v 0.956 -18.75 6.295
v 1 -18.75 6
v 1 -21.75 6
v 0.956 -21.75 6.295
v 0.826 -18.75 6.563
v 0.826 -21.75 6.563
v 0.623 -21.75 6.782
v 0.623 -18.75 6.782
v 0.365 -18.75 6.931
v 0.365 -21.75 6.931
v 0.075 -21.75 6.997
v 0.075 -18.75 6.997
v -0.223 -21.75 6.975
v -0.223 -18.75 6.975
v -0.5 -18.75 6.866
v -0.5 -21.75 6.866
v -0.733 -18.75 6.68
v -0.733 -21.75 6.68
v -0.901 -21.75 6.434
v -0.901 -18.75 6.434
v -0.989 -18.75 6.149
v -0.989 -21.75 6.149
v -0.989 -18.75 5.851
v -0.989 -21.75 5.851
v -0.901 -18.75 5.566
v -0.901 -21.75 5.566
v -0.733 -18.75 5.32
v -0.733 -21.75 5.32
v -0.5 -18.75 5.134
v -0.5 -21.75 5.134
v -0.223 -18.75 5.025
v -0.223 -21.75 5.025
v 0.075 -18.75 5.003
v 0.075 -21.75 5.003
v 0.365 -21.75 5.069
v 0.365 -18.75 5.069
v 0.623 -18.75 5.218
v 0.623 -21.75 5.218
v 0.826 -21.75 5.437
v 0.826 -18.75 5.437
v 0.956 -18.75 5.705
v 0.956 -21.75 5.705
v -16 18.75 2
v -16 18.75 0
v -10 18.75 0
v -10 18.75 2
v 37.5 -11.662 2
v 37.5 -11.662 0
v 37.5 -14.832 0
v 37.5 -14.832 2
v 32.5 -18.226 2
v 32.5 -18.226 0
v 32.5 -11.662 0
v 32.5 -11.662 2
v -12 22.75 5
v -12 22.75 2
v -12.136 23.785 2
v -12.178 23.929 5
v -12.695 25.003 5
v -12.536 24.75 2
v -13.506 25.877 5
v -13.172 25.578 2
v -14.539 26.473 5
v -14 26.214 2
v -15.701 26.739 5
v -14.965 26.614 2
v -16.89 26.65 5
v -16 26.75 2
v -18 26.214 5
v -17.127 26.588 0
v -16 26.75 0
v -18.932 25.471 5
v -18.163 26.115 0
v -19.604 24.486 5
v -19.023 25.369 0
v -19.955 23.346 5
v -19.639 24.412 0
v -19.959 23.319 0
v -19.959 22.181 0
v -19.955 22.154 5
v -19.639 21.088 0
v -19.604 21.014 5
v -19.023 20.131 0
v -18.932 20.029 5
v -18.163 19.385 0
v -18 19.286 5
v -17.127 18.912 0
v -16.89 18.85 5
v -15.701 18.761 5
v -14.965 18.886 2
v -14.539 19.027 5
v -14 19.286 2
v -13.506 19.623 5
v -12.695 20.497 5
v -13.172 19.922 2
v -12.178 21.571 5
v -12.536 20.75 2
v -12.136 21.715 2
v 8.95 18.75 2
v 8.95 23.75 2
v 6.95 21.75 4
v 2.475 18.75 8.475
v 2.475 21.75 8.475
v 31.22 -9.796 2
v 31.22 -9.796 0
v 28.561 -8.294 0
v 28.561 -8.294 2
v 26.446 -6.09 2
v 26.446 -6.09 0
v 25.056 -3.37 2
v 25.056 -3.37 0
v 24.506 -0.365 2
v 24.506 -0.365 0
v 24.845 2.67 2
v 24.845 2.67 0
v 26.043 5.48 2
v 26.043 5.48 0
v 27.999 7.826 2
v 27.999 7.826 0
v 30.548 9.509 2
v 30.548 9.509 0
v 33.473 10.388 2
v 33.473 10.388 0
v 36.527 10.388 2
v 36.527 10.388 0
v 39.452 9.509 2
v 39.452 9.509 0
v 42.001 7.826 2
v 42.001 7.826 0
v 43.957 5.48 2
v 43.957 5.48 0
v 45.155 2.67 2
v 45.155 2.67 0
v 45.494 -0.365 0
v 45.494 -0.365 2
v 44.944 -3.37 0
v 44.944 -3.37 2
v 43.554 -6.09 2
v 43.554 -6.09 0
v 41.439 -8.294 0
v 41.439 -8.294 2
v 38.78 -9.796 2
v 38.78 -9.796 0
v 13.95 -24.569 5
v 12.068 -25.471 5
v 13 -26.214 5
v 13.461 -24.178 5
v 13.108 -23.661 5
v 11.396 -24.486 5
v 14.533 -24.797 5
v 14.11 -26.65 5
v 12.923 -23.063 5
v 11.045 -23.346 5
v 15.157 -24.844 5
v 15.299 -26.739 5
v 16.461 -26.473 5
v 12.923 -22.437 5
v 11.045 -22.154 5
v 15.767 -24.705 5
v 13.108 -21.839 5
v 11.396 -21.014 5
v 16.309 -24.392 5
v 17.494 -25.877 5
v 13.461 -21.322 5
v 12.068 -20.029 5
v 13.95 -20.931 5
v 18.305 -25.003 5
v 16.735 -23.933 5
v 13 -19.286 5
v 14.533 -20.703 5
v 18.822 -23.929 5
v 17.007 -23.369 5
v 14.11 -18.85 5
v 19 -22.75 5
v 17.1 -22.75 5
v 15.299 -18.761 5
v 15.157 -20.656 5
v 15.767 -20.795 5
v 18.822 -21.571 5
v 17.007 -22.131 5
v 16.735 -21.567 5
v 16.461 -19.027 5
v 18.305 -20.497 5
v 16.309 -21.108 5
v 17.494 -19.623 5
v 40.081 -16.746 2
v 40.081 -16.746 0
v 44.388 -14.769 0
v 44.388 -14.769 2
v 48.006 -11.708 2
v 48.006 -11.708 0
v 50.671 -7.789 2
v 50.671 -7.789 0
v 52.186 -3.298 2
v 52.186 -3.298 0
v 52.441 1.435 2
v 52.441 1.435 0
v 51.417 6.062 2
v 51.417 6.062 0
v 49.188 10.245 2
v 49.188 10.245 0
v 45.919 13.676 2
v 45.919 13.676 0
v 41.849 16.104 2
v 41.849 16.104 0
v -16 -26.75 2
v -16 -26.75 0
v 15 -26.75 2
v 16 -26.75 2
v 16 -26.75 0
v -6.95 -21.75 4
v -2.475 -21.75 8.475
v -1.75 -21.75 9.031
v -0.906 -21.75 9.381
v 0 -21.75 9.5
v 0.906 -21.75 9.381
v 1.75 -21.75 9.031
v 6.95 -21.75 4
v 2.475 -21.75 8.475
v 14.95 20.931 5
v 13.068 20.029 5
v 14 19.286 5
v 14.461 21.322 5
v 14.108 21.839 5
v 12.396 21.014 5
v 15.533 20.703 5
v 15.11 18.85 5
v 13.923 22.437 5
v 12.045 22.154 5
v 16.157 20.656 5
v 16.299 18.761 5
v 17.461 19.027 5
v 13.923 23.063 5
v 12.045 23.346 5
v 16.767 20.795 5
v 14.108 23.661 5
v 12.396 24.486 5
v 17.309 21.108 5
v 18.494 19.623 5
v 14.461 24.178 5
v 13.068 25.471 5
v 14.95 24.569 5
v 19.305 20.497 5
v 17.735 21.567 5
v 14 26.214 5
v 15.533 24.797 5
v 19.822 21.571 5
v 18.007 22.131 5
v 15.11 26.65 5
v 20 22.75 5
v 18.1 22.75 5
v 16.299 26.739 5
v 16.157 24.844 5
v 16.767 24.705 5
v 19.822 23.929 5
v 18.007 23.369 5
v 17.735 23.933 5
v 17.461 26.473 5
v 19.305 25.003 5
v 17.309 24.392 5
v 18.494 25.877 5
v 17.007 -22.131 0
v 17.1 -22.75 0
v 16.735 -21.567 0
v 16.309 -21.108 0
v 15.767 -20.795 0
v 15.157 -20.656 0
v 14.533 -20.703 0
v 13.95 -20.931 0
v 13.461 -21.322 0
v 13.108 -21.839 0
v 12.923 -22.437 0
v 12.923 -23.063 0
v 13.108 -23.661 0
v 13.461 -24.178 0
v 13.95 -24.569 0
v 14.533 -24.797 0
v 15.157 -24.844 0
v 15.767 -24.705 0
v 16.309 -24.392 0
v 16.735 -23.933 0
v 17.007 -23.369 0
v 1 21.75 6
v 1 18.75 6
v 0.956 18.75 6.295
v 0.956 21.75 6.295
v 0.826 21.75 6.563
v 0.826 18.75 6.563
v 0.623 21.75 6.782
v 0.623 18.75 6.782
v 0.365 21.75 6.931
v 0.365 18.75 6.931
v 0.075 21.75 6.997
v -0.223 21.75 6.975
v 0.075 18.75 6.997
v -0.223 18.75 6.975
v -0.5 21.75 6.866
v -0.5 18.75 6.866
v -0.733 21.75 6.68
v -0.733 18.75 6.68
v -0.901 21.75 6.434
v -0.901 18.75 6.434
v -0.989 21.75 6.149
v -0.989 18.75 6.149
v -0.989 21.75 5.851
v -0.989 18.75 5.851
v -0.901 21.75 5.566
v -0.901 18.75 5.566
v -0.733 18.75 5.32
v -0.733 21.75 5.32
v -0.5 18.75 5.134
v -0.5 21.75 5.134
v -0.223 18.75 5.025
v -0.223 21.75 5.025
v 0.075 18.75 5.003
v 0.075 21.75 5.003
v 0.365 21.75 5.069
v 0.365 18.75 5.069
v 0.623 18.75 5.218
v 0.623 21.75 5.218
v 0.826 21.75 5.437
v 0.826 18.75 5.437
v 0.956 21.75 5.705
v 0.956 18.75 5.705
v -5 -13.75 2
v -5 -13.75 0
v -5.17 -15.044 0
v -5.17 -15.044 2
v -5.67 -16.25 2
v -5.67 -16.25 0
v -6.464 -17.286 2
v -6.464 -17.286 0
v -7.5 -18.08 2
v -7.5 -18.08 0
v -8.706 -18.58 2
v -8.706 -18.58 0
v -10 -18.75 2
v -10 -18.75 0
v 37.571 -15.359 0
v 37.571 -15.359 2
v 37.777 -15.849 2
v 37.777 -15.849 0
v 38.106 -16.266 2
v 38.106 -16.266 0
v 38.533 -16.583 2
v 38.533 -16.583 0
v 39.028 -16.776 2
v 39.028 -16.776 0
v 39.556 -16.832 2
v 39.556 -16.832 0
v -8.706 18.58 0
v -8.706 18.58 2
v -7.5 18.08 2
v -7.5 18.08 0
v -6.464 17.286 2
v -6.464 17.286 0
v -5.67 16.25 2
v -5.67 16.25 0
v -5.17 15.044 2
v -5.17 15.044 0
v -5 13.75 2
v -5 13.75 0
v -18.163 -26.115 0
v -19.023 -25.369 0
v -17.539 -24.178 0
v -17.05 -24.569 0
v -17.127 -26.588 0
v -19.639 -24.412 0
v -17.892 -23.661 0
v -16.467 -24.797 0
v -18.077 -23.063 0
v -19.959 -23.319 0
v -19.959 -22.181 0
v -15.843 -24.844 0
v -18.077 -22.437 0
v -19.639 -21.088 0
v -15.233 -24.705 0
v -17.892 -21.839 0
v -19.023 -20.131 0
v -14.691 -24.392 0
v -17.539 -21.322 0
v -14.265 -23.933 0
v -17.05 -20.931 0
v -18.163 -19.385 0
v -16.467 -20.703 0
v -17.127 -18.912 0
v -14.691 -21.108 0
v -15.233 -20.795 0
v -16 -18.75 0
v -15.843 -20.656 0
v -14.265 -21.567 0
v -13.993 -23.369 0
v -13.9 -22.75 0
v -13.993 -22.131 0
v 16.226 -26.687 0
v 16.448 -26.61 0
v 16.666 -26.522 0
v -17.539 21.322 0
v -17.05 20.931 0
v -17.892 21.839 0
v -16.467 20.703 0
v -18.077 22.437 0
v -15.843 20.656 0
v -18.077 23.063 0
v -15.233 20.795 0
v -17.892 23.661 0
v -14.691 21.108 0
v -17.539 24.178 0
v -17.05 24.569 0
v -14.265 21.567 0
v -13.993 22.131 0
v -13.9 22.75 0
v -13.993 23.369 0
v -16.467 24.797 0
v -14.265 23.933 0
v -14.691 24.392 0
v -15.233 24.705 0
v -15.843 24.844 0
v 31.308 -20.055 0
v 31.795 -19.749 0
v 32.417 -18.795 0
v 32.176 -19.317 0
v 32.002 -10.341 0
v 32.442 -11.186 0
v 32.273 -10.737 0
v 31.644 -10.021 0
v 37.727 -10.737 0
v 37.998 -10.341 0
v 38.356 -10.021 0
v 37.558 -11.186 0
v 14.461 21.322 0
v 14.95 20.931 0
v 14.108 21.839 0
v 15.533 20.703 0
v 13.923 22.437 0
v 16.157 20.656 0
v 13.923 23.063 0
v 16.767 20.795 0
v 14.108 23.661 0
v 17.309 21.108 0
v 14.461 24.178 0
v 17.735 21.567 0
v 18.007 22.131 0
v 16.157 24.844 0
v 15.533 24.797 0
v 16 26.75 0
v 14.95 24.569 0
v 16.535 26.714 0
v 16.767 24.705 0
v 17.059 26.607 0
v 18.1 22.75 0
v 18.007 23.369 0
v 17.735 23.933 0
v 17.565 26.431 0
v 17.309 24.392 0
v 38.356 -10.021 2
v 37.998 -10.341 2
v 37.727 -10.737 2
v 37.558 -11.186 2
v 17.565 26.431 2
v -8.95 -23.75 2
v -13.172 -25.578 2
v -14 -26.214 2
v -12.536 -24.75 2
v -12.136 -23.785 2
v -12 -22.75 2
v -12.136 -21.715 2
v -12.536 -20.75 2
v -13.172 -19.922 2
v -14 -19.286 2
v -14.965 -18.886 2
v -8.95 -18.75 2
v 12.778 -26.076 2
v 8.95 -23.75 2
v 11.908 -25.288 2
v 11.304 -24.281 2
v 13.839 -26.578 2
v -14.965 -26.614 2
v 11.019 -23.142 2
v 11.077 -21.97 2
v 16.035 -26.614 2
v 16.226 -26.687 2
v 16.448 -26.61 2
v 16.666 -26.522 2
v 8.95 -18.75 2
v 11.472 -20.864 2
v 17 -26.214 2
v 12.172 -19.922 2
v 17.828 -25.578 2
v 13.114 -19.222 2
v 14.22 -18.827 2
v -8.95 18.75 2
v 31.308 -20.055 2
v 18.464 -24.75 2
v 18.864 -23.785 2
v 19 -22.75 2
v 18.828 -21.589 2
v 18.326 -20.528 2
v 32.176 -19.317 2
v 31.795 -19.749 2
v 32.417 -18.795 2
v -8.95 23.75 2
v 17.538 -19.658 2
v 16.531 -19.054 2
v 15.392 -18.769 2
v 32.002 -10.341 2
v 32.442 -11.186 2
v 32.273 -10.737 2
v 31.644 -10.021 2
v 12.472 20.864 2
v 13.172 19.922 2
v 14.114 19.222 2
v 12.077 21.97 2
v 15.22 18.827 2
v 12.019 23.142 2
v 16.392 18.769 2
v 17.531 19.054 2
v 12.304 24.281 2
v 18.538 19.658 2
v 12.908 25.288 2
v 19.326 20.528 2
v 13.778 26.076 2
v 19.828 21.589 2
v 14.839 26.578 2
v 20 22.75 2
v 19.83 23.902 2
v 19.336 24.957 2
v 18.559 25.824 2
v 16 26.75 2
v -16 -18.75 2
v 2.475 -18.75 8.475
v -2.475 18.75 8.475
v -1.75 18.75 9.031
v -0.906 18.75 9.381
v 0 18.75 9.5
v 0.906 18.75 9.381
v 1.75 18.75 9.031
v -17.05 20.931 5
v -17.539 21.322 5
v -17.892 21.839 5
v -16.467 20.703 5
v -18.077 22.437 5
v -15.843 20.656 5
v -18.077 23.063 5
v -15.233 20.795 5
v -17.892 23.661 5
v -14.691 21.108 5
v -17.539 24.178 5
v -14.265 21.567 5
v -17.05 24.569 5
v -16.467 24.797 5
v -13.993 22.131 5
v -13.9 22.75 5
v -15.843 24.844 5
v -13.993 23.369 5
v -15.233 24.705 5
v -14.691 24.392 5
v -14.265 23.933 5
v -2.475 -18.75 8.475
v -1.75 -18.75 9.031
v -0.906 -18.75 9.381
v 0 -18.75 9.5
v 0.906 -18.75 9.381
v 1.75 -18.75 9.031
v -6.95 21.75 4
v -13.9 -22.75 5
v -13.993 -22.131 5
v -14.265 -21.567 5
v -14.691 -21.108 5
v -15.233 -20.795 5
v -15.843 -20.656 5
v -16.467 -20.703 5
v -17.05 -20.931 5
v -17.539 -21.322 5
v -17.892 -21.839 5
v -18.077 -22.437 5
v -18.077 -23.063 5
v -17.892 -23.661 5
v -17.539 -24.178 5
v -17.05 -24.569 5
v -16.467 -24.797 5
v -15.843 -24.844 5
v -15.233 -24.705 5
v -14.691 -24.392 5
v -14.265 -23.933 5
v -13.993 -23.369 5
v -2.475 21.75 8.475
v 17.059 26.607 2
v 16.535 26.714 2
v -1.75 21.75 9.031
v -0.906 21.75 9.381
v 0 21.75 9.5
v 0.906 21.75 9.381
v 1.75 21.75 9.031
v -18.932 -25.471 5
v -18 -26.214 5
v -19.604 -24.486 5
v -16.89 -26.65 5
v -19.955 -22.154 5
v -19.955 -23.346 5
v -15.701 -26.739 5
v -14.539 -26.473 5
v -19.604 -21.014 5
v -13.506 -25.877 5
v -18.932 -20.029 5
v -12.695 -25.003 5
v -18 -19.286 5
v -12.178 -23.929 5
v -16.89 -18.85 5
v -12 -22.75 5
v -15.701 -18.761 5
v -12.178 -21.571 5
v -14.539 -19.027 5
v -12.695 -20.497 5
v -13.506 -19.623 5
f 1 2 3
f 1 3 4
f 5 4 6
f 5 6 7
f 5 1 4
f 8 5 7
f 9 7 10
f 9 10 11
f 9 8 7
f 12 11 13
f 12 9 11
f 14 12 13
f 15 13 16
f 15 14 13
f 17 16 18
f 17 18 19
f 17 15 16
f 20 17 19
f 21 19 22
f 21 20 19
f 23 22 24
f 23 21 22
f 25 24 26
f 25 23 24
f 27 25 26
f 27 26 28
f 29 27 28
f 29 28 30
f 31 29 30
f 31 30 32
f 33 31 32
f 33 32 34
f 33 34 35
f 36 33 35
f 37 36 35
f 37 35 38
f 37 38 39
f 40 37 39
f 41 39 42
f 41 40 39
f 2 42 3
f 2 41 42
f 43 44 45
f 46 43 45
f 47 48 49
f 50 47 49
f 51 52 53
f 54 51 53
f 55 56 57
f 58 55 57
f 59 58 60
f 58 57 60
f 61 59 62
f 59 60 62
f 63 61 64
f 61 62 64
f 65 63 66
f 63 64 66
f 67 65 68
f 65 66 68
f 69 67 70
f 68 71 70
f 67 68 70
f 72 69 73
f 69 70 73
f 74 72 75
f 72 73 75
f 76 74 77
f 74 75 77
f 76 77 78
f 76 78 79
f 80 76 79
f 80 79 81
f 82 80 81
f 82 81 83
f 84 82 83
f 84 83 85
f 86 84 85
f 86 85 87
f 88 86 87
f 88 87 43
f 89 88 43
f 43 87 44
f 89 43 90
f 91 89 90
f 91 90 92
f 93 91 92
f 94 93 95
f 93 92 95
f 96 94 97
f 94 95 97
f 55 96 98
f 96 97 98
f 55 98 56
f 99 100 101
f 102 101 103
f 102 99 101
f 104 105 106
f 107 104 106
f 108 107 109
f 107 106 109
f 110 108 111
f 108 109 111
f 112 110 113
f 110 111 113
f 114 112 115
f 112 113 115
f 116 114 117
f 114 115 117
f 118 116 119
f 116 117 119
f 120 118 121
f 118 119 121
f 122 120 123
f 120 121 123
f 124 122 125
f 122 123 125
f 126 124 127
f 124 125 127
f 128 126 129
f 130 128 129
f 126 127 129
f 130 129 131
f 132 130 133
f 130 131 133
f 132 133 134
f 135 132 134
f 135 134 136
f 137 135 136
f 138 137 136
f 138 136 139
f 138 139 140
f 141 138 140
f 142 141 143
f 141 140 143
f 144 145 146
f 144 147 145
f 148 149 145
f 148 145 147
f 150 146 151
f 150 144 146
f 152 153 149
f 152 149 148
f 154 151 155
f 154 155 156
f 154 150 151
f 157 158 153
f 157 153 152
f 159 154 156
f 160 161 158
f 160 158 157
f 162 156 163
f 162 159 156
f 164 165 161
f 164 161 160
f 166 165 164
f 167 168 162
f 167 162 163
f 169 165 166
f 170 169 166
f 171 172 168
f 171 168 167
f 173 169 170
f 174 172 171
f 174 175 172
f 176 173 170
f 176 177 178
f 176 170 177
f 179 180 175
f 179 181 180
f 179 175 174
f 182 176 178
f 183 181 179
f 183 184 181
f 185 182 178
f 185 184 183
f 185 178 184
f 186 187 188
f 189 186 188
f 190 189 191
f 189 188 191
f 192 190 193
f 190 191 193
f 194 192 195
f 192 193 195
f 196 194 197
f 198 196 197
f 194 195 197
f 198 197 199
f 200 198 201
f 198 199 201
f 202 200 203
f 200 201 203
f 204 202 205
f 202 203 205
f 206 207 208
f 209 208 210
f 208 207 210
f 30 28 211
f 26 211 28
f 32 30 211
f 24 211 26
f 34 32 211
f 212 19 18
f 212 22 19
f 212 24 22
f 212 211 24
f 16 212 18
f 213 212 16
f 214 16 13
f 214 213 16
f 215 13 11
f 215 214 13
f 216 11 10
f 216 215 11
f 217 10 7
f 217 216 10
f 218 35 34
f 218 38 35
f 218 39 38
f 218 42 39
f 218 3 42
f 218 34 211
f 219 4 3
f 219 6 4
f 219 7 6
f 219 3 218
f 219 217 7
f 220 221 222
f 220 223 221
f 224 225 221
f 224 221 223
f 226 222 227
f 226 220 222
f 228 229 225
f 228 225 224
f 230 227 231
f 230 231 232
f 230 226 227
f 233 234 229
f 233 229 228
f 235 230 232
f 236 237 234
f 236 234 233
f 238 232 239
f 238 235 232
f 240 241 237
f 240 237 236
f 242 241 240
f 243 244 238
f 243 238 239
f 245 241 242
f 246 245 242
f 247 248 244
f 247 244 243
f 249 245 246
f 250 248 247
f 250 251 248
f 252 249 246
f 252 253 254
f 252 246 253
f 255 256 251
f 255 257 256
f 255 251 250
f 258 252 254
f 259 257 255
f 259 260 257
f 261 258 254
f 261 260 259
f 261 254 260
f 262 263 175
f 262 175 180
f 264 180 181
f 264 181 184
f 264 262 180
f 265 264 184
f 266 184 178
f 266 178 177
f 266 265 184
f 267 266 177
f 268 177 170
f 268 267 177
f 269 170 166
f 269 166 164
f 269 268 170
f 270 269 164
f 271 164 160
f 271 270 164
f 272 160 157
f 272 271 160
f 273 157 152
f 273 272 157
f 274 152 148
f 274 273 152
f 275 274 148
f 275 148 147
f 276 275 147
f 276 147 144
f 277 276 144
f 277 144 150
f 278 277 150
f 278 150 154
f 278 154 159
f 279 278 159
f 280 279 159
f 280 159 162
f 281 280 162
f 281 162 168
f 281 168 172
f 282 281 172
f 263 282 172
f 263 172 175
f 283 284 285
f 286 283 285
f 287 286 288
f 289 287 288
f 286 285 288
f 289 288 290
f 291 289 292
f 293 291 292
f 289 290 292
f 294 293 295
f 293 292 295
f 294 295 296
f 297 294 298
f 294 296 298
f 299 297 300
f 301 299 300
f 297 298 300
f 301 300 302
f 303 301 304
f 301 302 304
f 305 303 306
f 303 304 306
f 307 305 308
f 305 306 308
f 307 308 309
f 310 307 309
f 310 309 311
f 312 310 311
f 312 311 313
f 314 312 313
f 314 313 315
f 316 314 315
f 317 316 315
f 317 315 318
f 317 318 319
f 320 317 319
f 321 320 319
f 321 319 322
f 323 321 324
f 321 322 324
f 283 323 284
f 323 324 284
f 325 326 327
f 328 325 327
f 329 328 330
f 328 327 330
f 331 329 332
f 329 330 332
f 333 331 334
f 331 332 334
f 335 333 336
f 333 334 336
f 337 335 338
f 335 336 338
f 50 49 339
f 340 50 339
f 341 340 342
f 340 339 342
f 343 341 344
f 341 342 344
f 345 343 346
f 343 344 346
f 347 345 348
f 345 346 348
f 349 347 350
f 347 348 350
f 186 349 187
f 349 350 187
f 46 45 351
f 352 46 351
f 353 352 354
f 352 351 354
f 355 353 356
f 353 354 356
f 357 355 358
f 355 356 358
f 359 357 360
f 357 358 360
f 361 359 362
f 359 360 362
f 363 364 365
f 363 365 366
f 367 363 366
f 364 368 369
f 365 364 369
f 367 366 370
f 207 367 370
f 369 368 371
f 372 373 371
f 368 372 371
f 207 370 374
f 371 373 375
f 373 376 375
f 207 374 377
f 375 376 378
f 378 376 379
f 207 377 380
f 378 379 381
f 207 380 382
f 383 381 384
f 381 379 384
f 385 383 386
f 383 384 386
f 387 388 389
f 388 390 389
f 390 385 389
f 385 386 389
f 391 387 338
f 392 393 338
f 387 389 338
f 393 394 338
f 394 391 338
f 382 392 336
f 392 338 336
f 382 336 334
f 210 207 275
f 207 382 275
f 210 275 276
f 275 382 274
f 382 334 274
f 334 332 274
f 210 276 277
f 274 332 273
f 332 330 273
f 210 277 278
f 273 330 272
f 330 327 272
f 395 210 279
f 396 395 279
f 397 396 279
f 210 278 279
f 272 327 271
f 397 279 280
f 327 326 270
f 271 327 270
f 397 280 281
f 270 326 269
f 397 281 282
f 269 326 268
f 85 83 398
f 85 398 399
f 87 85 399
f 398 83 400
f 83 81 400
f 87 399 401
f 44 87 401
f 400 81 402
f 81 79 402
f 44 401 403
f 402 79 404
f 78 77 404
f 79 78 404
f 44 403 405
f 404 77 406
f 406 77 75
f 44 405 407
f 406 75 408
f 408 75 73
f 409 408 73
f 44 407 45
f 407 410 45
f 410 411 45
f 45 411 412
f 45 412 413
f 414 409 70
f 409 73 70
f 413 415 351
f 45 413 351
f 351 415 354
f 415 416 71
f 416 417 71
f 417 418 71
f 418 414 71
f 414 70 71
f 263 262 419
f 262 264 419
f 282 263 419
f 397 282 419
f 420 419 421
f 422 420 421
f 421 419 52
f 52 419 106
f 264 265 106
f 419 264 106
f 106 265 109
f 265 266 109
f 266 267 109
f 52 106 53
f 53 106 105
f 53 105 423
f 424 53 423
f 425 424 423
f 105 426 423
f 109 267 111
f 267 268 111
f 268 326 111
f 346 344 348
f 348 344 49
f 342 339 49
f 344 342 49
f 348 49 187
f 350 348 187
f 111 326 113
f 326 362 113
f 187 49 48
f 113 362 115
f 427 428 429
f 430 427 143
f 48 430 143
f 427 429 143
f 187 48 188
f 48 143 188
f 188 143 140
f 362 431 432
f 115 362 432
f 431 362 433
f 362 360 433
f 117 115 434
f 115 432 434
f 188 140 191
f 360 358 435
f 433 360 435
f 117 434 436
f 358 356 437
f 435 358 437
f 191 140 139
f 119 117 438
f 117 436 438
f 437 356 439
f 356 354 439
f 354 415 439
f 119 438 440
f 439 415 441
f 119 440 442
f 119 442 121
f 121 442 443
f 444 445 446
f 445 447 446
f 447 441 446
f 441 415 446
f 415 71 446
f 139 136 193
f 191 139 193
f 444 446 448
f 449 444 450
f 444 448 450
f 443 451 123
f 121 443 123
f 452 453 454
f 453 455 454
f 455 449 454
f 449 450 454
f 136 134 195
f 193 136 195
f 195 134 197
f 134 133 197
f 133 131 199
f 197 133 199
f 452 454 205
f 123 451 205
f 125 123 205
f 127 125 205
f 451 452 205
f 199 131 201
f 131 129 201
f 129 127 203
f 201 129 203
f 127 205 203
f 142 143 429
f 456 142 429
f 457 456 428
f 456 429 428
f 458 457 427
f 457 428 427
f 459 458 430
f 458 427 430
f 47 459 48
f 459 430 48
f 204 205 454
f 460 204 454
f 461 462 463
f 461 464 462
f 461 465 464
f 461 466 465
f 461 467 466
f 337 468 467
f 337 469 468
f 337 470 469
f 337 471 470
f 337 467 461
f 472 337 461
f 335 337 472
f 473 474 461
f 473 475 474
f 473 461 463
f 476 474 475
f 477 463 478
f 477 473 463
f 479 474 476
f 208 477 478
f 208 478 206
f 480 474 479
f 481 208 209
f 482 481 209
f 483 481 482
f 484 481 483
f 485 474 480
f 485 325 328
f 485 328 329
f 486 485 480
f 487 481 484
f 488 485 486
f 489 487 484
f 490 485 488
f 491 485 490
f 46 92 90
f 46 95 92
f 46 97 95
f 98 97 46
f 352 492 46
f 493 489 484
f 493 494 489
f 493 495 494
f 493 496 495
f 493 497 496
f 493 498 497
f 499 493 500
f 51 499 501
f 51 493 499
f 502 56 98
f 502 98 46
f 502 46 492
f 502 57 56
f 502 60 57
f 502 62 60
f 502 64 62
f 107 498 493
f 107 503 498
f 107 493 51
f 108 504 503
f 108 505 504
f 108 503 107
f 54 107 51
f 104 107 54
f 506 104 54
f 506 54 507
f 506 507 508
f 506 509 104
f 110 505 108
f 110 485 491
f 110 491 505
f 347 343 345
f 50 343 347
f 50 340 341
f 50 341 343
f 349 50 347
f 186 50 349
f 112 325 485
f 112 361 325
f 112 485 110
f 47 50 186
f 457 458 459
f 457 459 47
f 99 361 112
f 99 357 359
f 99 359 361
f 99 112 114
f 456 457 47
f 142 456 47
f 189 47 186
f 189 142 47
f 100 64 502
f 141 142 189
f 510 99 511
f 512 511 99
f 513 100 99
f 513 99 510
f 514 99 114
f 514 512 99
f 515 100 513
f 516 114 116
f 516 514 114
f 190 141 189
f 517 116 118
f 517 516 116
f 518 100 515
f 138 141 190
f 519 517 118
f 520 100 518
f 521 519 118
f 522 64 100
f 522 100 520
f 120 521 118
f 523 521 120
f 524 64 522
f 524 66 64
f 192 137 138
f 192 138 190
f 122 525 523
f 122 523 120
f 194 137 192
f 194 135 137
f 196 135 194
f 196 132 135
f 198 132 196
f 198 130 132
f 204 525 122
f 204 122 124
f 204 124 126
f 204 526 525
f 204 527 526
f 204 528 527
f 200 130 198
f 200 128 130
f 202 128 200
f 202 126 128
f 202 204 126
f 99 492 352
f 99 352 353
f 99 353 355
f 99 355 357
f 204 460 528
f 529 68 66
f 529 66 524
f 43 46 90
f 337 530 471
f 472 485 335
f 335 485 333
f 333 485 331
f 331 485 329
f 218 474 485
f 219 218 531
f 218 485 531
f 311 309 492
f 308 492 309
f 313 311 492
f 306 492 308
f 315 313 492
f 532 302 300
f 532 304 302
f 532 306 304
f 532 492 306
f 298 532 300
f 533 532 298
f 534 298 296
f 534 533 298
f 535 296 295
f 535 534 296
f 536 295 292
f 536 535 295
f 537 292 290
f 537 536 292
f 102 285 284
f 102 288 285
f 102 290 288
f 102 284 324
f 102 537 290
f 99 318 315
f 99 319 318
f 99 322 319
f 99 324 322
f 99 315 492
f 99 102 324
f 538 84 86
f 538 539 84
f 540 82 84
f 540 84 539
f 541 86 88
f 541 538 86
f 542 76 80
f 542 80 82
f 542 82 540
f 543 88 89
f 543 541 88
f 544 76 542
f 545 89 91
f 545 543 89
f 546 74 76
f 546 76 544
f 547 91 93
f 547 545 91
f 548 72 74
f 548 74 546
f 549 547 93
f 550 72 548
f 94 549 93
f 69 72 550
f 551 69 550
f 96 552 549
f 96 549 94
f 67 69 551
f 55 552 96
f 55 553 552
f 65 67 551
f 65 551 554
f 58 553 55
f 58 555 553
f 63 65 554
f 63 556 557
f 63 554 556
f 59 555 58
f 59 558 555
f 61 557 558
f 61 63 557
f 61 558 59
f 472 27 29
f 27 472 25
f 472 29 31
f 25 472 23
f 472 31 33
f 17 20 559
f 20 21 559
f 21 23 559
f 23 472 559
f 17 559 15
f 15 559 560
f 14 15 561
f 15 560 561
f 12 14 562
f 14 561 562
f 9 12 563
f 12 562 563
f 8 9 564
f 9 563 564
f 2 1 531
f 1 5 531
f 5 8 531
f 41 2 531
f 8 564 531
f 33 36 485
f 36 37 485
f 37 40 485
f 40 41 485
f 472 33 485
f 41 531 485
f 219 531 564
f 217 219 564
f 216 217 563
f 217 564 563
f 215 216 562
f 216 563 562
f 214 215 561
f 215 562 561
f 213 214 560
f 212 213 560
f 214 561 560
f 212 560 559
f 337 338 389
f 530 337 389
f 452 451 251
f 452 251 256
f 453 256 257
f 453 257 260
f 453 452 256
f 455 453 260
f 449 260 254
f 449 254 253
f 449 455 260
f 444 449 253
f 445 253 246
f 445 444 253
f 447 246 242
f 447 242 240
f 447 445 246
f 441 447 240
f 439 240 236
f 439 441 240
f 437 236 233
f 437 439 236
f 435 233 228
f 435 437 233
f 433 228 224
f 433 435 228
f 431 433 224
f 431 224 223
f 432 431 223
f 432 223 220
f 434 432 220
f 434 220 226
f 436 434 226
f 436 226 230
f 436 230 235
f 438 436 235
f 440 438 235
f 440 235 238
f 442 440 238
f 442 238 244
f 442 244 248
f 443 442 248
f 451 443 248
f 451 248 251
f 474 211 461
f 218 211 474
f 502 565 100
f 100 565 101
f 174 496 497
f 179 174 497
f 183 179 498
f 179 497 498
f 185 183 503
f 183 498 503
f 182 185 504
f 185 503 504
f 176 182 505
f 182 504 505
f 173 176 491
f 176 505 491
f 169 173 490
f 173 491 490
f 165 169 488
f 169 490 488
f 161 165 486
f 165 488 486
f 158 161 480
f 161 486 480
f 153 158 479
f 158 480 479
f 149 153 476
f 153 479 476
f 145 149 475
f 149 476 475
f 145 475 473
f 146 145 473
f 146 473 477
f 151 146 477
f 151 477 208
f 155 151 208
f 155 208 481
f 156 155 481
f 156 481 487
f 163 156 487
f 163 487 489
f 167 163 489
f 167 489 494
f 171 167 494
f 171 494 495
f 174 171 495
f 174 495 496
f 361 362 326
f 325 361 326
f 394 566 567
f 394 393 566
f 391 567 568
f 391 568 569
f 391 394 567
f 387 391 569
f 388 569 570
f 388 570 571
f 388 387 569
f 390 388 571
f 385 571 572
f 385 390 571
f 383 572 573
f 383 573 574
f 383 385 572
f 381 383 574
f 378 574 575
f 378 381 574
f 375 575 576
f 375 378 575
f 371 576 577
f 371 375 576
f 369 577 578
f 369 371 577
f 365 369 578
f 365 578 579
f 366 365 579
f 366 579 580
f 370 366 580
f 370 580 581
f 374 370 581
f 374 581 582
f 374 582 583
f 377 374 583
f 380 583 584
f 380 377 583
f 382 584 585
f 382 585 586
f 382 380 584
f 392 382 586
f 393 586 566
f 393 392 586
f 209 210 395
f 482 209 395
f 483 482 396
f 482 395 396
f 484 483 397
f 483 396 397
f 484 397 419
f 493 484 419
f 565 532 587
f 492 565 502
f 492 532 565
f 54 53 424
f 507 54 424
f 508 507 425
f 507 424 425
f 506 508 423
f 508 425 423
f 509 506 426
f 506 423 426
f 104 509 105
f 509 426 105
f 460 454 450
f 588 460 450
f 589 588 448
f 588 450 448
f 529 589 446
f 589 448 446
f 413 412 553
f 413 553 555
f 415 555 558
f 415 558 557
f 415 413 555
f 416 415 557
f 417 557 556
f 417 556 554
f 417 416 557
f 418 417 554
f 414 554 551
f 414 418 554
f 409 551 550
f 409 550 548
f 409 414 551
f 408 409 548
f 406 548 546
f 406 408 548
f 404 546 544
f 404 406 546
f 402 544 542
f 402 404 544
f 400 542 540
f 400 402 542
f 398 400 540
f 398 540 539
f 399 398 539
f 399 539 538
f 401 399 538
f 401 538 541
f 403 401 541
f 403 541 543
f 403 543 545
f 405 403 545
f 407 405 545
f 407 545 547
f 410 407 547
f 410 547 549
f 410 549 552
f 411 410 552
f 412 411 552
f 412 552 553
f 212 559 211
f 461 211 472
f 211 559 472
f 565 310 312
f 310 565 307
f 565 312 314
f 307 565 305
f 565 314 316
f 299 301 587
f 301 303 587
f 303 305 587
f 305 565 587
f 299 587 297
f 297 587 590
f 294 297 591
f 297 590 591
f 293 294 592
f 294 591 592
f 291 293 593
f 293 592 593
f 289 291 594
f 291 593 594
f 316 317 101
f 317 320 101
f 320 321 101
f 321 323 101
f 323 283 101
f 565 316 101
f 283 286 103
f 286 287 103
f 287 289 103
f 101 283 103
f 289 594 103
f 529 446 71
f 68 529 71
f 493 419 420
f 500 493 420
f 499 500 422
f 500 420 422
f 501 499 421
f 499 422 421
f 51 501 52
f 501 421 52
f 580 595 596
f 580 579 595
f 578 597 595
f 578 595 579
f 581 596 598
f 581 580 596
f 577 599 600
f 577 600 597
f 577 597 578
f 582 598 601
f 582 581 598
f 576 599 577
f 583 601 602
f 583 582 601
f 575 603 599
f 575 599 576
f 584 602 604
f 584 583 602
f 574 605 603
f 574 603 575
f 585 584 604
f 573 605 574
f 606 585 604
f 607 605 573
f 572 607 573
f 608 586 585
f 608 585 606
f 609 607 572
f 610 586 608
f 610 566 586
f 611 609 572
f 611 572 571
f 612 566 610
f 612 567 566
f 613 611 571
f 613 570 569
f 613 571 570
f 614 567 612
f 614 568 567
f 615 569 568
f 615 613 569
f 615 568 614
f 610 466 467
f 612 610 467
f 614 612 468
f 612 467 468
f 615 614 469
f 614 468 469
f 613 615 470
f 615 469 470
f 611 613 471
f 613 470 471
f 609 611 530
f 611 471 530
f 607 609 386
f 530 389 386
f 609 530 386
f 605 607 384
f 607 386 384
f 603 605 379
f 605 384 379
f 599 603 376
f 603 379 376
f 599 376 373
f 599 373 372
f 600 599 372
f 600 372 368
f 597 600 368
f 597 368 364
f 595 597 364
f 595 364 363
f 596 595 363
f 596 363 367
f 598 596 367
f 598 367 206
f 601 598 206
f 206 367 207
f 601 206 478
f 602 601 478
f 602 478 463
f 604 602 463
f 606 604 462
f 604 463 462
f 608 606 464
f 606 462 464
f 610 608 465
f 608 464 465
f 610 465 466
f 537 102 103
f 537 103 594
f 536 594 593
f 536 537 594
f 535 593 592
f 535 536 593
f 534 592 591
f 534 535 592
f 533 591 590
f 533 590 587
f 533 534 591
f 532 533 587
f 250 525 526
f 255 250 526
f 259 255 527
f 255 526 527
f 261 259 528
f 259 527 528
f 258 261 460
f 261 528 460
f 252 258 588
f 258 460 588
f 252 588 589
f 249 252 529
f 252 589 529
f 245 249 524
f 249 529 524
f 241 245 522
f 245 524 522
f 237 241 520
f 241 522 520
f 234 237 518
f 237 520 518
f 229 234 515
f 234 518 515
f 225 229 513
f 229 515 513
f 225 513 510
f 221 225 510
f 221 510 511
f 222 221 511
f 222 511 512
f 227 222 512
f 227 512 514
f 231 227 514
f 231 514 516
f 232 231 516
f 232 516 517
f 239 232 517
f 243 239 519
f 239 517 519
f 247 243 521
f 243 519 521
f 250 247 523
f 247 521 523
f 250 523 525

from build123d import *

# Parameters (mm, degrees)
SKETCH1_R                = 2.1
BOSS_EXTRUDE1_DEPTH      = 2
BOSS_EXTRUDE2_START      = -8
SKETCH2_R                = 1
BOSS_EXTRUDE2_DEPTH      = 3
CHAMFER1_SIZE            = 2
CHAMFER1_OF_MIRROR2_SIZE = 2
SKETCH3_R                = 4
SKETCH3_R_2              = 2.1
BOSS_EXTRUDE3_DEPTH      = 3


with BuildPart() as part:
    # Sketch1 → Boss-Extrude1 (new body)
    with BuildSketch(Plane.XY):
        with BuildLine():
            Line((-16, -26.75), (16, -26.75))
            ThreePointArc((16, -26.75), (16.337730018, -26.650061333), (16.665698596, -26.521663849))
            Line((16.665698596, -26.521663849), (31.3079825, -20.055119449))
            ThreePointArc((31.3079825, -20.055119449), (32.175703584, -19.31738929), (32.5, -18.225593751))
            Line((32.5, -18.225593751), (32.5, -11.66190379))
            ThreePointArc((32.5, -11.66190379), (32.14924225, -10.53053294), (31.22, -9.795999183))
            ThreePointArc((31.22, -9.795999183), (35, 10.5), (38.78, -9.795999183))
            ThreePointArc((38.78, -9.795999183), (37.85075775, -10.53053294), (37.5, -11.66190379))
            Line((37.5, -11.66190379), (37.5, -14.832396974))
            ThreePointArc((37.5, -14.832396974), (38.308633206, -16.438835632), (40.080645161, -16.746254648))
            ThreePointArc((40.080645161, -16.746254648), (52.47471331, -0.940422641), (41.848535598, 16.104271488))
            Line((41.848535598, 16.104271488), (17.565379565, 26.43097634))
            ThreePointArc((17.565379565, 26.43097634), (16.798778642, 26.669432699), (16, 26.75))
            Line((16, 26.75), (-16, 26.75))
            ThreePointArc((-16, 26.75), (-20, 22.75), (-16, 18.75))
            Line((-16, 18.75), (-10, 18.75))
            ThreePointArc((-10, 18.75), (-6.464466094, 17.285533906), (-5, 13.75))
            Line((-5, 13.75), (-5, -13.75))
            ThreePointArc((-5, -13.75), (-6.464466094, -17.285533906), (-10, -18.75))
            Line((-10, -18.75), (-16, -18.75))
            ThreePointArc((-16, -18.75), (-20, -22.75), (-16, -26.75))
        make_face()
        with Locations((-16, 22.75)):
            Circle(SKETCH1_R, mode=Mode.SUBTRACT)
        with Locations((16, 22.75)):
            Circle(SKETCH1_R, mode=Mode.SUBTRACT)
        with Locations((15, -22.75)):
            Circle(SKETCH1_R, mode=Mode.SUBTRACT)
        with Locations((-16, -22.75)):
            Circle(SKETCH1_R, mode=Mode.SUBTRACT)
    extrude(amount=BOSS_EXTRUDE1_DEPTH)

    # Sketch2 → Boss-Extrude2 (add)
    with BuildSketch(Plane.XZ.offset(26.75).offset(BOSS_EXTRUDE2_START)):
        with BuildLine():
            Line((-2.474873734, 8.474873734), (-8.949747468, 2))
            Line((-8.949747468, 2), (8.949747468, 2))
            Line((8.949747468, 2), (2.474873734, 8.474873734))
            ThreePointArc((2.474873734, 8.474873734), (0, 9.5), (-2.474873734, 8.474873734))
        make_face()
        with Locations((0, 6)):
            Circle(SKETCH2_R, mode=Mode.SUBTRACT)
    boss_extrude2 = extrude(amount=BOSS_EXTRUDE2_DEPTH)

    # Chamfer1
    chamfer1_edges = [part.edges().sort_by_distance(p)[0] for p in [
        (0, -21.75, 2),
    ]]
    chamfer(chamfer1_edges, length=CHAMFER1_SIZE)

    # Mirror2: Boss-Extrude2 across plane
    add(boss_extrude2.mirror(Plane.ZX))

    # Chamfer1 of Mirror2
    chamfer1_of_mirror2_edges = [part.edges().sort_by_distance(p)[0] for p in [
        (0, 21.75, 2),
    ]]
    chamfer(chamfer1_of_mirror2_edges, length=CHAMFER1_OF_MIRROR2_SIZE)

    # Sketch3 → Boss-Extrude3 (add)
    with BuildSketch(Plane.XY.offset(2)):
        with Locations((-16, -22.75)):
            Circle(SKETCH3_R)
        with Locations((-16, -22.75)):
            Circle(SKETCH3_R_2, mode=Mode.SUBTRACT)
        with Locations((15, -22.75)):
            Circle(SKETCH3_R)
        with Locations((15, -22.75)):
            Circle(SKETCH3_R_2, mode=Mode.SUBTRACT)
        with Locations((16, 22.75)):
            Circle(SKETCH3_R)
        with Locations((16, 22.75)):
            Circle(SKETCH3_R_2, mode=Mode.SUBTRACT)
        with Locations((-16, 22.75)):
            Circle(SKETCH3_R)
        with Locations((-16, 22.75)):
            Circle(SKETCH3_R_2, mode=Mode.SUBTRACT)
    extrude(amount=BOSS_EXTRUDE3_DEPTH)


solid = part.part
